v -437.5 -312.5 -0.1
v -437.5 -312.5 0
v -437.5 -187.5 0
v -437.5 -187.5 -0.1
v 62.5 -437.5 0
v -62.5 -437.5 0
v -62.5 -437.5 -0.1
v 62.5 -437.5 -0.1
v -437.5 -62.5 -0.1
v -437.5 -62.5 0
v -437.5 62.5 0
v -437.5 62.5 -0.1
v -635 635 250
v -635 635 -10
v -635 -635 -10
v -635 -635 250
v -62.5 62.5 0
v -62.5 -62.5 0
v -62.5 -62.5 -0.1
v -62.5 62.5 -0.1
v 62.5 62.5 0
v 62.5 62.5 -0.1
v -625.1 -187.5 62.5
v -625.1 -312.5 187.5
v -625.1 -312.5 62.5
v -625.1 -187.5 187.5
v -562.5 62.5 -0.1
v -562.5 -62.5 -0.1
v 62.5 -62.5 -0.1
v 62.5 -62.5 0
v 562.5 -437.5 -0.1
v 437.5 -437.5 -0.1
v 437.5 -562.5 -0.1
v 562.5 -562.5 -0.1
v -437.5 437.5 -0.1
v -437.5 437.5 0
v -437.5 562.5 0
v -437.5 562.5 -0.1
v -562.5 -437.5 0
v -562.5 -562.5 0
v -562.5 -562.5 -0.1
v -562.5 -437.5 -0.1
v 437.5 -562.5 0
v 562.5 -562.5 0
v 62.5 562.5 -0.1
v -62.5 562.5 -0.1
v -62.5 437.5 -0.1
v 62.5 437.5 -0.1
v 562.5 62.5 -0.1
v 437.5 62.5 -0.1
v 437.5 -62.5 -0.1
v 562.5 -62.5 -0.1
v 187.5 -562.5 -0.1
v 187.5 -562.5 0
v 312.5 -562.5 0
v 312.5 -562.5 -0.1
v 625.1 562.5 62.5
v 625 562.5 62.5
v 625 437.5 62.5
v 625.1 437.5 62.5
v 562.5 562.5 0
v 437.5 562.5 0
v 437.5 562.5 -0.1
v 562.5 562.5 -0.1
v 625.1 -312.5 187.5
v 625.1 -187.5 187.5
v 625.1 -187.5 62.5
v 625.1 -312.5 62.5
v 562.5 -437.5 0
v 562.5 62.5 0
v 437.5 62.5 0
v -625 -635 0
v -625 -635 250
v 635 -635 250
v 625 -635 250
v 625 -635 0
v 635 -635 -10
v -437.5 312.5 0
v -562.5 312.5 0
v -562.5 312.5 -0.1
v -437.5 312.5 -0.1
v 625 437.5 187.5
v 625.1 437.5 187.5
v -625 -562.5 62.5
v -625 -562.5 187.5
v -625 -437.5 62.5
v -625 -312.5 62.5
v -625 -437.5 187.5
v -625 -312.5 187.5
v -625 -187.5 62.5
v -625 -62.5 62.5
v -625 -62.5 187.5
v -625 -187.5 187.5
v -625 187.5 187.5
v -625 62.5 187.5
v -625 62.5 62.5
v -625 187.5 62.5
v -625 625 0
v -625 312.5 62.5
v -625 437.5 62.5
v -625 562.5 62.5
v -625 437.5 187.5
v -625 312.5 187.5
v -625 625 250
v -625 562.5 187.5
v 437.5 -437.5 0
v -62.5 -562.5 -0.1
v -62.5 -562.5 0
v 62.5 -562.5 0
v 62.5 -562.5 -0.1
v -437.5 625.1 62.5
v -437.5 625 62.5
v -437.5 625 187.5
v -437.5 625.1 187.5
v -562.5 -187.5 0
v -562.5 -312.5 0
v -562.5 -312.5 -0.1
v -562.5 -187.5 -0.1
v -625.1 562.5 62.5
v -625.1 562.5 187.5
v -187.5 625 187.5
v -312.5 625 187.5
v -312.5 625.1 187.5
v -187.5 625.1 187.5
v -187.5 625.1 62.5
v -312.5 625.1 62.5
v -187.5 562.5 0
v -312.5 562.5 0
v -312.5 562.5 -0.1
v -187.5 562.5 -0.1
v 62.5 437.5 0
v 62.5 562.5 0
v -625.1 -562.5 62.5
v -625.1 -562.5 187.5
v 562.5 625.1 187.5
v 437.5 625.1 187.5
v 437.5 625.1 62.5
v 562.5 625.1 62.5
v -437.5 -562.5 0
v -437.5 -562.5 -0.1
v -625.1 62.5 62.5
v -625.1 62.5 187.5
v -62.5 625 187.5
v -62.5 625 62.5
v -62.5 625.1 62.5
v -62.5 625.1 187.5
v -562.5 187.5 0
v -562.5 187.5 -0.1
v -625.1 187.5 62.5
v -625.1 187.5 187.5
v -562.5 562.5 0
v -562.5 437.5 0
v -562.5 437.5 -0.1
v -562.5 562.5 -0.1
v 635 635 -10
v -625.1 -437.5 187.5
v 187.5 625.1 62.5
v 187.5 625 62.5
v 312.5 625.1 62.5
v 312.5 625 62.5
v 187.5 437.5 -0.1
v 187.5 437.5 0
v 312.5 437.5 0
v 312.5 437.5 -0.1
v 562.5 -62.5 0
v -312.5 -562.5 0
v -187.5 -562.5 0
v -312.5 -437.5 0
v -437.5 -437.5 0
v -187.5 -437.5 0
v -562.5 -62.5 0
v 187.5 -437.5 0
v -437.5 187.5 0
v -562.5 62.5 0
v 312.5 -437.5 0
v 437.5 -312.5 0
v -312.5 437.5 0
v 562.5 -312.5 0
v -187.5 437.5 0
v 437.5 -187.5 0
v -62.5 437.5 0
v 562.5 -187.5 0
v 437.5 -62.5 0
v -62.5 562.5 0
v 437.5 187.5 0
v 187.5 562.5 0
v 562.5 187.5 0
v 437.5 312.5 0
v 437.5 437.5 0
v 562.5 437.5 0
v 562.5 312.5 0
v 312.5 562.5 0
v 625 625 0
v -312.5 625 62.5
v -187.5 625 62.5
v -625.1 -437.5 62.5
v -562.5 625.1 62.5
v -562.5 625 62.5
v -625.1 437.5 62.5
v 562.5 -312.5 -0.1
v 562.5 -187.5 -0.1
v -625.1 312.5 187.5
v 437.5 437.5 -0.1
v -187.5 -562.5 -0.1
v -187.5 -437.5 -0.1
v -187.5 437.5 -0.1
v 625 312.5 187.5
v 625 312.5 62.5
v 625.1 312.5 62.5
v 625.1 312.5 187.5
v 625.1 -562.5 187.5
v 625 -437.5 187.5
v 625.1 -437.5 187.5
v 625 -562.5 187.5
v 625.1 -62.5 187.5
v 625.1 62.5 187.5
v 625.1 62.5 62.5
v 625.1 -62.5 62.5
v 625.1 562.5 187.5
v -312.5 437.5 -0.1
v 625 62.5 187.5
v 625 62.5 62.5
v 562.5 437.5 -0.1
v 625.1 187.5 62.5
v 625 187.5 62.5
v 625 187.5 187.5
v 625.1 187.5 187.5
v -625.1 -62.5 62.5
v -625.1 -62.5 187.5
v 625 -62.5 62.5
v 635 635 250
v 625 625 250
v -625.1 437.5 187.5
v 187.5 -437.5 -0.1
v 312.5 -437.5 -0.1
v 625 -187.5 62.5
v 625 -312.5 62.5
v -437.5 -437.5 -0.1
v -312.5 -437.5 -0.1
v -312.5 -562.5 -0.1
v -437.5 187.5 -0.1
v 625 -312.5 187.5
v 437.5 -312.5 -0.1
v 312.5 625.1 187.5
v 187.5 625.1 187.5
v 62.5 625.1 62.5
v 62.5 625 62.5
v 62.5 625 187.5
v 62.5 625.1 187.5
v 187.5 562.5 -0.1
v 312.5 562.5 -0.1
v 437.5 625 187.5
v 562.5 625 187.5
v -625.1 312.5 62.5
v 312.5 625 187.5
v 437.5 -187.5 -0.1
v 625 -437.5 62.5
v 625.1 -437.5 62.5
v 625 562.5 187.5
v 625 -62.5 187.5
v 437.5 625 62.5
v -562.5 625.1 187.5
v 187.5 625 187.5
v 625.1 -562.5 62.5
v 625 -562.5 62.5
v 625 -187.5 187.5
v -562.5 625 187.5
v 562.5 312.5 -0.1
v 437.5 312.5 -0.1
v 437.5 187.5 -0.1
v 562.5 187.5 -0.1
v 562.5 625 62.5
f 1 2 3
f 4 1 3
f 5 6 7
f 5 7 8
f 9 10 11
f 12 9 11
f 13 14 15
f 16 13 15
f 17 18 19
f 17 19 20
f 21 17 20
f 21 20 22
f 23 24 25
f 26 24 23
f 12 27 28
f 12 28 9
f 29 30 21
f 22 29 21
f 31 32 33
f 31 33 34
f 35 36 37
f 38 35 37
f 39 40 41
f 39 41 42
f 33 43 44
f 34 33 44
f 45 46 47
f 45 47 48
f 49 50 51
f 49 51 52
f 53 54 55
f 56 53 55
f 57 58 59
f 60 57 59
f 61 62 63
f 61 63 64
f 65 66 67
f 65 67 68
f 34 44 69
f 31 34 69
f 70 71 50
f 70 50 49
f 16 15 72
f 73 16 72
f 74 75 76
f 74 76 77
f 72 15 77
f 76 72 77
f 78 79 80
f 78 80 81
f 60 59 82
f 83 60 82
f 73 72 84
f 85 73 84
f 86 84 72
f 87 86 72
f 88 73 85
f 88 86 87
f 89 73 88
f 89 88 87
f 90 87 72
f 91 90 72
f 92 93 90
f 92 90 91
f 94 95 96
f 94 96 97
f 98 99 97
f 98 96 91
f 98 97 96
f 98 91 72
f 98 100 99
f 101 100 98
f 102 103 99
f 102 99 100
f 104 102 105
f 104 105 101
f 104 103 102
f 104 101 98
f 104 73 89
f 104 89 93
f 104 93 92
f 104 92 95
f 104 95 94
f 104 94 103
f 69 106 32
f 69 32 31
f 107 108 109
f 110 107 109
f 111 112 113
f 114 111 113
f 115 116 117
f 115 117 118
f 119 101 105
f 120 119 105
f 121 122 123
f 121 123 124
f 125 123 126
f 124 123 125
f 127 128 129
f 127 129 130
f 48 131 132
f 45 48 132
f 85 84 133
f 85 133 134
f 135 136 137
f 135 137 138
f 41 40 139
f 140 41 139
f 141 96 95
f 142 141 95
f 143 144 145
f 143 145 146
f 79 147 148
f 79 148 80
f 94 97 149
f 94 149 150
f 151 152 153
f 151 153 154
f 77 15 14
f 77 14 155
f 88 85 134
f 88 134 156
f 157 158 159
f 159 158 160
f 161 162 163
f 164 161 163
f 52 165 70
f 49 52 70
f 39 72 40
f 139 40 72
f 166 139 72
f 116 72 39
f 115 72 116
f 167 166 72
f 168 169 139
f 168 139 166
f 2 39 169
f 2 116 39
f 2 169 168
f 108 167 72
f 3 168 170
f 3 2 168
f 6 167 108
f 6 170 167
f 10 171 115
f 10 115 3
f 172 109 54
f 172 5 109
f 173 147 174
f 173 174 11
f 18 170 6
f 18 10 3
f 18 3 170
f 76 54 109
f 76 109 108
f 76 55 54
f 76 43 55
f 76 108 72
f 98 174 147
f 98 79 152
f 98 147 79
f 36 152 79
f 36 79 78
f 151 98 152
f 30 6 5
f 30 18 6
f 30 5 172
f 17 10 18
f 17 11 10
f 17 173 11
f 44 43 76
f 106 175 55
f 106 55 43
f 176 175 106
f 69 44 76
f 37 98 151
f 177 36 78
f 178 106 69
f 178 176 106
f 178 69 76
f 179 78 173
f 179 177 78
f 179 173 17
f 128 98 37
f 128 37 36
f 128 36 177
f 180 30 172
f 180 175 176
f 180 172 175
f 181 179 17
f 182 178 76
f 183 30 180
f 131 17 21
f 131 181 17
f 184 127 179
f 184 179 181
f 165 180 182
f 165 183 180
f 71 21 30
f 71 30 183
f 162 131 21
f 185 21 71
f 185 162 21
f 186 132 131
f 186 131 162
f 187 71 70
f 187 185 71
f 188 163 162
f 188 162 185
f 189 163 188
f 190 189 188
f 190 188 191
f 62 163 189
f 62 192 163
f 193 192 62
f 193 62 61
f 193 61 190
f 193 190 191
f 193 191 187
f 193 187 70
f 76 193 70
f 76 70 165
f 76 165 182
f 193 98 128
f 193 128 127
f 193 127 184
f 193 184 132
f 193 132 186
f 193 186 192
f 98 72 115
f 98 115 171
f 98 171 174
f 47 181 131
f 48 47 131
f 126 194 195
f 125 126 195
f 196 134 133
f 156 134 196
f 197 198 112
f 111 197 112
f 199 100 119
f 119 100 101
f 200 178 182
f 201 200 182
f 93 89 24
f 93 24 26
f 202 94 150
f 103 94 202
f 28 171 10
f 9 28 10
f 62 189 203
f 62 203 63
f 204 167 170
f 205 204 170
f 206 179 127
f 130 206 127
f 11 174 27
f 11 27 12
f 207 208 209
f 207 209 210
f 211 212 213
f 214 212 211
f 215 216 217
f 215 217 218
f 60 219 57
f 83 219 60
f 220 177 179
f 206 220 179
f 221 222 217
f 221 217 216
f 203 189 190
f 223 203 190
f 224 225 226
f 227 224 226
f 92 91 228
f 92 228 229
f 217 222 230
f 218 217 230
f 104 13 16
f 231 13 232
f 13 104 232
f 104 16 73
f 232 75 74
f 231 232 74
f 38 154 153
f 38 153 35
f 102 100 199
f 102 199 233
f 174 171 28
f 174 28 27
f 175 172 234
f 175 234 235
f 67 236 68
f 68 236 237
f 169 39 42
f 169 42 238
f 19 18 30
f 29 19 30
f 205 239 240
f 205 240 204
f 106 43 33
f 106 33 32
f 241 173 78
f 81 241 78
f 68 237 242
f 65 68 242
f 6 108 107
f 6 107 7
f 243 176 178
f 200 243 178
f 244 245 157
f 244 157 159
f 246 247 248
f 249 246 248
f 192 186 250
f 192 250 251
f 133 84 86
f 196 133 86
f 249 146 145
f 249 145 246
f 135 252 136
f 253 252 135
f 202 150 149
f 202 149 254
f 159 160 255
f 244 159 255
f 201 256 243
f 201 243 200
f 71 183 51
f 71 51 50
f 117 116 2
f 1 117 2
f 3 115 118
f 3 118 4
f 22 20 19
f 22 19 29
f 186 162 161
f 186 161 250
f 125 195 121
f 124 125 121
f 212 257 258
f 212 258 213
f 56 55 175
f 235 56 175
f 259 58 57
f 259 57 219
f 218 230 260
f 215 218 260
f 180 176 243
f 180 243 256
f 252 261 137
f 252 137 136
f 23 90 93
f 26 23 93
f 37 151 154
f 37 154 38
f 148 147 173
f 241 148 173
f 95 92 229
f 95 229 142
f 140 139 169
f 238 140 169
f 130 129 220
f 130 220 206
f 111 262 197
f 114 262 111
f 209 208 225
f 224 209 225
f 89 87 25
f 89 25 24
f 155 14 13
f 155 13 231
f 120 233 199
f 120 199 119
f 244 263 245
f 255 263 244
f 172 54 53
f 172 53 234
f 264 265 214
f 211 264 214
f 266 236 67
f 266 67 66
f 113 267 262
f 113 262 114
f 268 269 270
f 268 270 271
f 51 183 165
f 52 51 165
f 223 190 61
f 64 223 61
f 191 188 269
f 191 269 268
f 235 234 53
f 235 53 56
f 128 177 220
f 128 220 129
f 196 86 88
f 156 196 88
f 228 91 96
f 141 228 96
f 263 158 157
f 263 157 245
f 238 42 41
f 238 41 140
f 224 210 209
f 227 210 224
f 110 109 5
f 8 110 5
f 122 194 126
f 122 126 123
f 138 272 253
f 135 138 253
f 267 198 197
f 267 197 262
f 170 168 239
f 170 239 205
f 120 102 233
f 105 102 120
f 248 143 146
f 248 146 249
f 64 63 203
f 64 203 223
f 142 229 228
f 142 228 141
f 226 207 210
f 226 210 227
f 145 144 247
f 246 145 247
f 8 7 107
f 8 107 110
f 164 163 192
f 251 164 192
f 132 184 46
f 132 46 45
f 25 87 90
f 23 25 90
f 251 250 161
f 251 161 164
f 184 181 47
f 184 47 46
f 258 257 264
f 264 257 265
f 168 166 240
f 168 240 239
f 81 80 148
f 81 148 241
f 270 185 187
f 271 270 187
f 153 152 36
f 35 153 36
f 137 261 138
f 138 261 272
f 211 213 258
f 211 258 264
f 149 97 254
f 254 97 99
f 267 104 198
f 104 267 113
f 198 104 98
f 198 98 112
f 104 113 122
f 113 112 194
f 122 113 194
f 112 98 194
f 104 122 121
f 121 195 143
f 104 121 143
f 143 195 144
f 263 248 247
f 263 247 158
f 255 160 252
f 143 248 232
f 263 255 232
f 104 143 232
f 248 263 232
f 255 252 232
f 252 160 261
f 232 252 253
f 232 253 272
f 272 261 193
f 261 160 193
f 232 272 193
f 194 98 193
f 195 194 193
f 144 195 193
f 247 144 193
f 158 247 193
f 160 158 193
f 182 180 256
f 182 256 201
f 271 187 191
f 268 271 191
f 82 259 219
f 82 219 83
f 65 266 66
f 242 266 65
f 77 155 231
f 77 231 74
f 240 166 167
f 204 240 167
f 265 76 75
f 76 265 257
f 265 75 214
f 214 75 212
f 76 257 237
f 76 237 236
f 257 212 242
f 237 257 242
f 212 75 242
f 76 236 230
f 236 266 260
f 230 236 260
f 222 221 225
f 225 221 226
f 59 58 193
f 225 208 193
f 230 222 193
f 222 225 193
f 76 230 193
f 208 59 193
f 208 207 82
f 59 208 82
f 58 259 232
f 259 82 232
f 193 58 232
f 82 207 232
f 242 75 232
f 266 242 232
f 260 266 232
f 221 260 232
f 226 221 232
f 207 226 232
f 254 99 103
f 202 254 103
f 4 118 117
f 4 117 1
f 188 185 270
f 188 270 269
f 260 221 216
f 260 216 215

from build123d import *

# Parameters (mm, degrees)
F1_W            = 1250
F1_H            = 1250
F2_DEPTH        = 10
F0_W            = 125
F0_H            = 125
F3_DEPTH        = 0.1
F4_W            = 1270
F4_H            = 1270
F4_W_2          = 1250
F4_H_2          = 1250
F5_DEPTH        = 260
F6_W            = 125
F6_H            = 125
F7_DEPTH        = 0.1
F7_COPIES_COUNT = 3
F7_COPIES_ANGLE = 180
F9_W            = 1250
F9_H            = 10
F10_DEPTH       = 250


# Not quite as in the source:
# - a pattern or mirror of a feature is missing from the dataset's text; its kind, count and spacing are read off the source's solid


with BuildPart() as f2:
    # F1 (on Top) → F2 (new body)
    with BuildSketch(Plane.XY):
        Rectangle(F1_W, F1_H)
    extrude(amount=-F2_DEPTH)

    # F0 (on Top) → F3 (cut)
    with BuildSketch(Plane.XY):
        with Locations((-500, 500)):
            Rectangle(F0_W, F0_H)
        with Locations((-250, 500)):
            Rectangle(F0_W, F0_H)
        with Locations((0, 500)):
            Rectangle(F0_W, F0_H)
        with Locations((250, 500)):
            Rectangle(F0_W, F0_H)
        with Locations((500, 500)):
            Rectangle(F0_W, F0_H)
        with Locations((-500, 250)):
            Rectangle(F0_W, F0_H)
        with Locations((-500, 0)):
            Rectangle(F0_W, F0_H)
        with Locations((-500, -250)):
            Rectangle(F0_W, F0_H)
        with Locations((-500, -500)):
            Rectangle(F0_W, F0_H)
        with Locations((250, -500)):
            Rectangle(F0_W, F0_H)
        with Locations((500, -500)):
            Rectangle(F0_W, F0_H)
        with Locations((500, 250)):
            Rectangle(F0_W, F0_H)
        with Locations((-250, -500)):
            Rectangle(F0_W, F0_H)
        with Locations((500, 0)):
            Rectangle(F0_W, F0_H)
        with Locations((0, -500)):
            Rectangle(F0_W, F0_H)
        with Locations((500, -250)):
            Rectangle(F0_W, F0_H)
        Rectangle(F0_W, F0_H)
    extrude(amount=-F3_DEPTH, mode=Mode.SUBTRACT)

    # F4 (on face) → F5 (join)
    with BuildSketch(Plane(origin=(0, 0, -10), x_dir=(1, 0, 0), z_dir=(0, 0, -1))):
        Rectangle(F4_W, F4_H)
        Rectangle(F4_W_2, F4_H_2, mode=Mode.SUBTRACT)
    extrude(amount=-F5_DEPTH)

    # F6 (on face) → F7 (cut)
    with BuildSketch(Plane.YZ.offset(-625)):
        with Locations((-499.9999926, 125.0000074)):
            Rectangle(F6_W, F6_H)
        with Locations((-249.9999926, 125.0000074)):
            Rectangle(F6_W, F6_H)
        with Locations((7.4e-06, 125.0000074)):
            Rectangle(F6_W, F6_H)
        with Locations((250.0000074, 125.0000074)):
            Rectangle(F6_W, F6_H)
        with Locations((500.0000074, 125.0000074)):
            Rectangle(F6_W, F6_H)
    f7 = extrude(amount=-F7_DEPTH, mode=Mode.SUBTRACT)

    # F7_copies: F7 ×3 about axis
    f7_copies_axis = Axis((0, 0, 0), (0, 0, -1))
    for i in range(1, F7_COPIES_COUNT):
        add(f7.rotate(f7_copies_axis, i * F7_COPIES_ANGLE / (F7_COPIES_COUNT - 1)), mode=Mode.SUBTRACT)

    # F9 (on face) → F10 (cut, through all)
    with BuildSketch(Plane.XY.offset(250)):
        with Locations((0, -630)):
            Rectangle(F9_W, F9_H)
    extrude(amount=-F10_DEPTH, mode=Mode.SUBTRACT)


solid = f2.part
